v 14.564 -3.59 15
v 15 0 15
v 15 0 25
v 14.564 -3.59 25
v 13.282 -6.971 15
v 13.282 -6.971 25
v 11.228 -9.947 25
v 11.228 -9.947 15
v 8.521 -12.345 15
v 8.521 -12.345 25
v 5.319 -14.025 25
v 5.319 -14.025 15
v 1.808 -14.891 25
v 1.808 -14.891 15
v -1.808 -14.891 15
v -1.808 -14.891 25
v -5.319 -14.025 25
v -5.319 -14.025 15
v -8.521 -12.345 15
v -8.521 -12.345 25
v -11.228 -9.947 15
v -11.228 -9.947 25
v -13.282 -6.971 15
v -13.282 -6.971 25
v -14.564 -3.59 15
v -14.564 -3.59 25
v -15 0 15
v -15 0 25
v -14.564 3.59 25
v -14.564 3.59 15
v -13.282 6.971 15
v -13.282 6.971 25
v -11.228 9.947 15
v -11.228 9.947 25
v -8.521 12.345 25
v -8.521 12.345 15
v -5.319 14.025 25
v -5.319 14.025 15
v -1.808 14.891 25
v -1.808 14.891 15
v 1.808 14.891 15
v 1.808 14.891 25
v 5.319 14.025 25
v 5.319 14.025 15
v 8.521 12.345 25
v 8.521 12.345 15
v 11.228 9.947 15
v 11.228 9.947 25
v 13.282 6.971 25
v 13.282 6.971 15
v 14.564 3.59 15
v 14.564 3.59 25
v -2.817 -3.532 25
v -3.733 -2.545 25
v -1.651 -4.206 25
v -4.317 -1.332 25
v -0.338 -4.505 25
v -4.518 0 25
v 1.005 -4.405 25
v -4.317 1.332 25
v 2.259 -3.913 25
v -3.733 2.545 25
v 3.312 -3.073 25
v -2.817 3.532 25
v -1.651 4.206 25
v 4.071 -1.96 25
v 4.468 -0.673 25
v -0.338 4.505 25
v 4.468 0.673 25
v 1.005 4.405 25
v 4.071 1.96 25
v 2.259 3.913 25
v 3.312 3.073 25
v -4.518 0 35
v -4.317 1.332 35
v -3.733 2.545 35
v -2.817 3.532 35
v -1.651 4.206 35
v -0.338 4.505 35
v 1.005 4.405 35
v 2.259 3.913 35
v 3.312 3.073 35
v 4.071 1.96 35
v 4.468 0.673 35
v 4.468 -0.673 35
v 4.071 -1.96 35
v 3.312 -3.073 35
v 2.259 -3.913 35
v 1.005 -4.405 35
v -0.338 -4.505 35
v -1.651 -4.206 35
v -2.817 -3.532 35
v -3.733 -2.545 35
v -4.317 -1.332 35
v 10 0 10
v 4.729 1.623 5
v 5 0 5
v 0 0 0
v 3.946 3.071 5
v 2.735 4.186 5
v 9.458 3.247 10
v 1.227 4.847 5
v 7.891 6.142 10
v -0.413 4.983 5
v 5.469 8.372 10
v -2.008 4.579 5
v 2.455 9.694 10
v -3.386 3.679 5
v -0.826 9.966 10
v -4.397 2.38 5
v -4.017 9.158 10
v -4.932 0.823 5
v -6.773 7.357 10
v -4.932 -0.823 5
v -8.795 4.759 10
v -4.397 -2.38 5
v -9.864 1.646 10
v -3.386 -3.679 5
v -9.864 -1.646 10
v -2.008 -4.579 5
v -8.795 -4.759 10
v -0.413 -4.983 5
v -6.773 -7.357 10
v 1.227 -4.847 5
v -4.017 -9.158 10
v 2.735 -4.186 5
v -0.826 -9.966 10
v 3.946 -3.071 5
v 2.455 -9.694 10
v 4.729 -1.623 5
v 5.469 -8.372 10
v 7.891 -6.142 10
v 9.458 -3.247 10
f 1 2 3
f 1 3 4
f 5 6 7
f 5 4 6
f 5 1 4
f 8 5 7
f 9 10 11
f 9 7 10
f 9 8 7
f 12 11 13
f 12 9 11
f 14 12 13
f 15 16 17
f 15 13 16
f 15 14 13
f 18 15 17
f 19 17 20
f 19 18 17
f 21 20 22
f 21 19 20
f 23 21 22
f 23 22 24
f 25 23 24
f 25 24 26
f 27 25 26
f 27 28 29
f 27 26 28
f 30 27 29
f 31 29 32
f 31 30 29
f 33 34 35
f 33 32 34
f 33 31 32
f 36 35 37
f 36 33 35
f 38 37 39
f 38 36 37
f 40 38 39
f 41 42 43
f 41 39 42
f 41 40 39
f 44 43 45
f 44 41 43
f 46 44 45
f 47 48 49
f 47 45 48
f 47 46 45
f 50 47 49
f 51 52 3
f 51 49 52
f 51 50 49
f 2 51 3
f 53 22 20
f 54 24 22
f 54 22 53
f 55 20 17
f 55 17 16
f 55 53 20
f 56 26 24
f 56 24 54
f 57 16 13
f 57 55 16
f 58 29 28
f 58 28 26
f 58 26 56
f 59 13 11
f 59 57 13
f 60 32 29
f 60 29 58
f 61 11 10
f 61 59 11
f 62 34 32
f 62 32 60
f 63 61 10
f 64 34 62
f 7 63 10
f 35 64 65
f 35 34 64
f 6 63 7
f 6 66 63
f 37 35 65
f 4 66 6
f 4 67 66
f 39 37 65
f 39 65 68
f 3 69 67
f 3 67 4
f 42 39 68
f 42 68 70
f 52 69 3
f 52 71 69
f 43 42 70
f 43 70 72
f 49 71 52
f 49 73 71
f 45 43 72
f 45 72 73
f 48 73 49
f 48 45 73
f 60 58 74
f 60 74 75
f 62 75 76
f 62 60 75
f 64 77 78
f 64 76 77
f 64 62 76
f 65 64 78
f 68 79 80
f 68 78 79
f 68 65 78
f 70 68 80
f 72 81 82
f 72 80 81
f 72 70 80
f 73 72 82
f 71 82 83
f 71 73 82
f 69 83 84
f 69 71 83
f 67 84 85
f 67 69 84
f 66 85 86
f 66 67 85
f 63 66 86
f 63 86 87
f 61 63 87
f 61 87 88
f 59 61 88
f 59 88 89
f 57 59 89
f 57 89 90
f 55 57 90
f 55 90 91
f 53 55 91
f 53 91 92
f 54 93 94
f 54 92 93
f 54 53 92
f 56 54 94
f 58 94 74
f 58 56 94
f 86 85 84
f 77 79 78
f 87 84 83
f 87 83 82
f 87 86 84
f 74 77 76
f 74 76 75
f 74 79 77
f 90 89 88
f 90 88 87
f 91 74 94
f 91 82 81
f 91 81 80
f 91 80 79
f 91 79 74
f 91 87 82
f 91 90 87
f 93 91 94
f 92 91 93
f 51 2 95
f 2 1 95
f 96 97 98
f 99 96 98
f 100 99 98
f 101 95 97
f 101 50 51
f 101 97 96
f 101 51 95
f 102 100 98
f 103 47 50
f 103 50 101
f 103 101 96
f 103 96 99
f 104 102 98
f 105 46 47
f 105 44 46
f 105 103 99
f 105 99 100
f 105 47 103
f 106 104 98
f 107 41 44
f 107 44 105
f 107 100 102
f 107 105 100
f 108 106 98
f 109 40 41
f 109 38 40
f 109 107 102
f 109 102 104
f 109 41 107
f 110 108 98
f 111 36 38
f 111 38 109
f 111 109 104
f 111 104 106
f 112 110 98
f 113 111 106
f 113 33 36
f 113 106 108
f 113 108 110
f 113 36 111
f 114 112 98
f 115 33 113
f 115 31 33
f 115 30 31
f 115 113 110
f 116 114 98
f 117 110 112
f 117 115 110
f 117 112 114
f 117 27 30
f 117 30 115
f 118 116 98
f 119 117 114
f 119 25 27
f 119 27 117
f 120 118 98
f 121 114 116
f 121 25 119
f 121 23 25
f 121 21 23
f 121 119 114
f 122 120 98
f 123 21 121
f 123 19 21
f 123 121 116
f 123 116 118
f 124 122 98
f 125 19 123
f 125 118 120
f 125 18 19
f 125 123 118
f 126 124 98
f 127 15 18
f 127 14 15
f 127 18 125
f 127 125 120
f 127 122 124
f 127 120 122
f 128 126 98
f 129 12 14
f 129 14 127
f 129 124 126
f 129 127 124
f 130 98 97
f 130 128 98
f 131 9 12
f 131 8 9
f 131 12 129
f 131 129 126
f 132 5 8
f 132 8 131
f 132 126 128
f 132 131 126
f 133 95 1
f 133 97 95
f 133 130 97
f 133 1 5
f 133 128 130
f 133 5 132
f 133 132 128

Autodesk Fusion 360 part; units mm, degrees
sketch "Sketch1" plane through (0, 0, 0) normal (0, 0, 1) x (1, 0, 0)
  circle A0 centre (0, 0) radius 15
  dimension "d1" = 30
extrude "Extrude1" add sketch "Sketch1" along normal blind 30
chamfer "Chamfer1" distance 15 angle 45 1 edges at (-13.9849, -5.4242, 0)
extrude "Extrude2" cut 1 faces at (3.8315, 5.6199, 30) along direction (0, 0, -1) blind 5
sketch "Sketch2" plane through (0, 0, 25) normal (0, 0, 1) x (-1, 0, 0)
  circle A0 centre (0, 0) radius 15
  circle A1 centre (0, 0) radius 4.518
  dimension "d7" = 9.036
extrude "Extrude3" add sketch "Sketch2" along normal blind 20 contours A1
extrude "Extrude4" cut 1 faces at (1.3657, -1.8727, 45) along direction (0, 0, -1) blind 10
equation "d7 = ( 4.518 * 2 ) * 1 mm"
